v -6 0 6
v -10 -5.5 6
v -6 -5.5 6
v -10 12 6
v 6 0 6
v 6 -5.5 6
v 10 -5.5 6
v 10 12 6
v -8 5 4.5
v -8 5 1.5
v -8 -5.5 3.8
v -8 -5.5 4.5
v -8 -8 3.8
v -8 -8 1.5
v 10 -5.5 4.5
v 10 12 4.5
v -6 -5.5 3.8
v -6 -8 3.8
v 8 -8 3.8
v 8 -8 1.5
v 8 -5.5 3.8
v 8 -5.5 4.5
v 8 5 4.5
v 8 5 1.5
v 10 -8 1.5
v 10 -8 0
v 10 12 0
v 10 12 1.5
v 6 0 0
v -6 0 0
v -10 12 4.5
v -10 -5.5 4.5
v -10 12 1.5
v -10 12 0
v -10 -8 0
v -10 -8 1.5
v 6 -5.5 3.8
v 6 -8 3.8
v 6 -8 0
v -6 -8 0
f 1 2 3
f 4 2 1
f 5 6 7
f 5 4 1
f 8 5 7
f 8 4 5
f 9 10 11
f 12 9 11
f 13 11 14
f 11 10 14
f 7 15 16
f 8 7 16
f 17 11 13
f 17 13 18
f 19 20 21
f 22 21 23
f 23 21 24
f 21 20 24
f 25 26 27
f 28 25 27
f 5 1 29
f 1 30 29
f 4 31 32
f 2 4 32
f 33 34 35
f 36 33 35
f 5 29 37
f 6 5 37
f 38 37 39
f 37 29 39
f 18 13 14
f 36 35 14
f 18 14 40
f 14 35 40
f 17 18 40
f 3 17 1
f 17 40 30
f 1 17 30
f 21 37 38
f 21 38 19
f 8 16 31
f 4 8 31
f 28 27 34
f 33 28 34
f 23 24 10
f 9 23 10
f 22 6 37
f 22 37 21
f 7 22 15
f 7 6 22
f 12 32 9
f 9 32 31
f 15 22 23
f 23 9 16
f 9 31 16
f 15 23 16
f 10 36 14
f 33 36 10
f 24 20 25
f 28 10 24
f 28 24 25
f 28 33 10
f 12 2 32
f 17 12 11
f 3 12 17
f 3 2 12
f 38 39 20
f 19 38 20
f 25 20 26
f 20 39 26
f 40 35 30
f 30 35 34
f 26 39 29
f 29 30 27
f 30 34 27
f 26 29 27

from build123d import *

# Parameters (mm, degrees)
F1_DEPTH = 1.5
F3_DEPTH = 3
F5_DEPTH = 1.5
F6_W     = 4
F6_H     = 2.5
F7_DEPTH = 2.2


# Not quite as in the source:
# - a feature names something its author has since deleted; it is built from what else it names


with BuildPart() as f1:
    # F0 (on Top) → F1 (new body)
    with BuildSketch(Plane.XY):
        Polygon((10, 12), (-10, 12), (-10, -8), (-6, -8), (-6, 0), (6, 0), (6, -8), (10, -8), align=None)
    extrude(amount=F1_DEPTH)

    # F2 (on face) → F3 (join)
    with BuildSketch(Plane.XY.offset(1.5)):
        Polygon((-8, 5), (-8, -8), (-6, -8), (-6, 0), (6, 0), (6, -8), (8, -8), (8, 5), align=None)
    extrude(amount=F3_DEPTH)

    # F4 (on face) → F5 (join)
    with BuildSketch(Plane.XY.offset(4.5)):
        Polygon((-8, -8), (-6, -8), (-6, 0), (6, 0), (6, -8), (8, -8), (8, 5), (-8, 5), align=None)
        Polygon((-10, -8), (-8, -8), (-8, 5), (8, 5), (8, -8), (10, -8), (10, 12), (-10, 12), align=None)
    extrude(amount=F5_DEPTH)

    # F6 (on face) → F7 (cut)
    with BuildSketch(Plane.XY.offset(6)):
        with Locations((-8, -6.75)):
            Rectangle(F6_W, F6_H)
        with Locations((8, -6.75)):
            Rectangle(F6_W, F6_H)
    extrude(amount=-F7_DEPTH, mode=Mode.SUBTRACT)


solid = f1.part
